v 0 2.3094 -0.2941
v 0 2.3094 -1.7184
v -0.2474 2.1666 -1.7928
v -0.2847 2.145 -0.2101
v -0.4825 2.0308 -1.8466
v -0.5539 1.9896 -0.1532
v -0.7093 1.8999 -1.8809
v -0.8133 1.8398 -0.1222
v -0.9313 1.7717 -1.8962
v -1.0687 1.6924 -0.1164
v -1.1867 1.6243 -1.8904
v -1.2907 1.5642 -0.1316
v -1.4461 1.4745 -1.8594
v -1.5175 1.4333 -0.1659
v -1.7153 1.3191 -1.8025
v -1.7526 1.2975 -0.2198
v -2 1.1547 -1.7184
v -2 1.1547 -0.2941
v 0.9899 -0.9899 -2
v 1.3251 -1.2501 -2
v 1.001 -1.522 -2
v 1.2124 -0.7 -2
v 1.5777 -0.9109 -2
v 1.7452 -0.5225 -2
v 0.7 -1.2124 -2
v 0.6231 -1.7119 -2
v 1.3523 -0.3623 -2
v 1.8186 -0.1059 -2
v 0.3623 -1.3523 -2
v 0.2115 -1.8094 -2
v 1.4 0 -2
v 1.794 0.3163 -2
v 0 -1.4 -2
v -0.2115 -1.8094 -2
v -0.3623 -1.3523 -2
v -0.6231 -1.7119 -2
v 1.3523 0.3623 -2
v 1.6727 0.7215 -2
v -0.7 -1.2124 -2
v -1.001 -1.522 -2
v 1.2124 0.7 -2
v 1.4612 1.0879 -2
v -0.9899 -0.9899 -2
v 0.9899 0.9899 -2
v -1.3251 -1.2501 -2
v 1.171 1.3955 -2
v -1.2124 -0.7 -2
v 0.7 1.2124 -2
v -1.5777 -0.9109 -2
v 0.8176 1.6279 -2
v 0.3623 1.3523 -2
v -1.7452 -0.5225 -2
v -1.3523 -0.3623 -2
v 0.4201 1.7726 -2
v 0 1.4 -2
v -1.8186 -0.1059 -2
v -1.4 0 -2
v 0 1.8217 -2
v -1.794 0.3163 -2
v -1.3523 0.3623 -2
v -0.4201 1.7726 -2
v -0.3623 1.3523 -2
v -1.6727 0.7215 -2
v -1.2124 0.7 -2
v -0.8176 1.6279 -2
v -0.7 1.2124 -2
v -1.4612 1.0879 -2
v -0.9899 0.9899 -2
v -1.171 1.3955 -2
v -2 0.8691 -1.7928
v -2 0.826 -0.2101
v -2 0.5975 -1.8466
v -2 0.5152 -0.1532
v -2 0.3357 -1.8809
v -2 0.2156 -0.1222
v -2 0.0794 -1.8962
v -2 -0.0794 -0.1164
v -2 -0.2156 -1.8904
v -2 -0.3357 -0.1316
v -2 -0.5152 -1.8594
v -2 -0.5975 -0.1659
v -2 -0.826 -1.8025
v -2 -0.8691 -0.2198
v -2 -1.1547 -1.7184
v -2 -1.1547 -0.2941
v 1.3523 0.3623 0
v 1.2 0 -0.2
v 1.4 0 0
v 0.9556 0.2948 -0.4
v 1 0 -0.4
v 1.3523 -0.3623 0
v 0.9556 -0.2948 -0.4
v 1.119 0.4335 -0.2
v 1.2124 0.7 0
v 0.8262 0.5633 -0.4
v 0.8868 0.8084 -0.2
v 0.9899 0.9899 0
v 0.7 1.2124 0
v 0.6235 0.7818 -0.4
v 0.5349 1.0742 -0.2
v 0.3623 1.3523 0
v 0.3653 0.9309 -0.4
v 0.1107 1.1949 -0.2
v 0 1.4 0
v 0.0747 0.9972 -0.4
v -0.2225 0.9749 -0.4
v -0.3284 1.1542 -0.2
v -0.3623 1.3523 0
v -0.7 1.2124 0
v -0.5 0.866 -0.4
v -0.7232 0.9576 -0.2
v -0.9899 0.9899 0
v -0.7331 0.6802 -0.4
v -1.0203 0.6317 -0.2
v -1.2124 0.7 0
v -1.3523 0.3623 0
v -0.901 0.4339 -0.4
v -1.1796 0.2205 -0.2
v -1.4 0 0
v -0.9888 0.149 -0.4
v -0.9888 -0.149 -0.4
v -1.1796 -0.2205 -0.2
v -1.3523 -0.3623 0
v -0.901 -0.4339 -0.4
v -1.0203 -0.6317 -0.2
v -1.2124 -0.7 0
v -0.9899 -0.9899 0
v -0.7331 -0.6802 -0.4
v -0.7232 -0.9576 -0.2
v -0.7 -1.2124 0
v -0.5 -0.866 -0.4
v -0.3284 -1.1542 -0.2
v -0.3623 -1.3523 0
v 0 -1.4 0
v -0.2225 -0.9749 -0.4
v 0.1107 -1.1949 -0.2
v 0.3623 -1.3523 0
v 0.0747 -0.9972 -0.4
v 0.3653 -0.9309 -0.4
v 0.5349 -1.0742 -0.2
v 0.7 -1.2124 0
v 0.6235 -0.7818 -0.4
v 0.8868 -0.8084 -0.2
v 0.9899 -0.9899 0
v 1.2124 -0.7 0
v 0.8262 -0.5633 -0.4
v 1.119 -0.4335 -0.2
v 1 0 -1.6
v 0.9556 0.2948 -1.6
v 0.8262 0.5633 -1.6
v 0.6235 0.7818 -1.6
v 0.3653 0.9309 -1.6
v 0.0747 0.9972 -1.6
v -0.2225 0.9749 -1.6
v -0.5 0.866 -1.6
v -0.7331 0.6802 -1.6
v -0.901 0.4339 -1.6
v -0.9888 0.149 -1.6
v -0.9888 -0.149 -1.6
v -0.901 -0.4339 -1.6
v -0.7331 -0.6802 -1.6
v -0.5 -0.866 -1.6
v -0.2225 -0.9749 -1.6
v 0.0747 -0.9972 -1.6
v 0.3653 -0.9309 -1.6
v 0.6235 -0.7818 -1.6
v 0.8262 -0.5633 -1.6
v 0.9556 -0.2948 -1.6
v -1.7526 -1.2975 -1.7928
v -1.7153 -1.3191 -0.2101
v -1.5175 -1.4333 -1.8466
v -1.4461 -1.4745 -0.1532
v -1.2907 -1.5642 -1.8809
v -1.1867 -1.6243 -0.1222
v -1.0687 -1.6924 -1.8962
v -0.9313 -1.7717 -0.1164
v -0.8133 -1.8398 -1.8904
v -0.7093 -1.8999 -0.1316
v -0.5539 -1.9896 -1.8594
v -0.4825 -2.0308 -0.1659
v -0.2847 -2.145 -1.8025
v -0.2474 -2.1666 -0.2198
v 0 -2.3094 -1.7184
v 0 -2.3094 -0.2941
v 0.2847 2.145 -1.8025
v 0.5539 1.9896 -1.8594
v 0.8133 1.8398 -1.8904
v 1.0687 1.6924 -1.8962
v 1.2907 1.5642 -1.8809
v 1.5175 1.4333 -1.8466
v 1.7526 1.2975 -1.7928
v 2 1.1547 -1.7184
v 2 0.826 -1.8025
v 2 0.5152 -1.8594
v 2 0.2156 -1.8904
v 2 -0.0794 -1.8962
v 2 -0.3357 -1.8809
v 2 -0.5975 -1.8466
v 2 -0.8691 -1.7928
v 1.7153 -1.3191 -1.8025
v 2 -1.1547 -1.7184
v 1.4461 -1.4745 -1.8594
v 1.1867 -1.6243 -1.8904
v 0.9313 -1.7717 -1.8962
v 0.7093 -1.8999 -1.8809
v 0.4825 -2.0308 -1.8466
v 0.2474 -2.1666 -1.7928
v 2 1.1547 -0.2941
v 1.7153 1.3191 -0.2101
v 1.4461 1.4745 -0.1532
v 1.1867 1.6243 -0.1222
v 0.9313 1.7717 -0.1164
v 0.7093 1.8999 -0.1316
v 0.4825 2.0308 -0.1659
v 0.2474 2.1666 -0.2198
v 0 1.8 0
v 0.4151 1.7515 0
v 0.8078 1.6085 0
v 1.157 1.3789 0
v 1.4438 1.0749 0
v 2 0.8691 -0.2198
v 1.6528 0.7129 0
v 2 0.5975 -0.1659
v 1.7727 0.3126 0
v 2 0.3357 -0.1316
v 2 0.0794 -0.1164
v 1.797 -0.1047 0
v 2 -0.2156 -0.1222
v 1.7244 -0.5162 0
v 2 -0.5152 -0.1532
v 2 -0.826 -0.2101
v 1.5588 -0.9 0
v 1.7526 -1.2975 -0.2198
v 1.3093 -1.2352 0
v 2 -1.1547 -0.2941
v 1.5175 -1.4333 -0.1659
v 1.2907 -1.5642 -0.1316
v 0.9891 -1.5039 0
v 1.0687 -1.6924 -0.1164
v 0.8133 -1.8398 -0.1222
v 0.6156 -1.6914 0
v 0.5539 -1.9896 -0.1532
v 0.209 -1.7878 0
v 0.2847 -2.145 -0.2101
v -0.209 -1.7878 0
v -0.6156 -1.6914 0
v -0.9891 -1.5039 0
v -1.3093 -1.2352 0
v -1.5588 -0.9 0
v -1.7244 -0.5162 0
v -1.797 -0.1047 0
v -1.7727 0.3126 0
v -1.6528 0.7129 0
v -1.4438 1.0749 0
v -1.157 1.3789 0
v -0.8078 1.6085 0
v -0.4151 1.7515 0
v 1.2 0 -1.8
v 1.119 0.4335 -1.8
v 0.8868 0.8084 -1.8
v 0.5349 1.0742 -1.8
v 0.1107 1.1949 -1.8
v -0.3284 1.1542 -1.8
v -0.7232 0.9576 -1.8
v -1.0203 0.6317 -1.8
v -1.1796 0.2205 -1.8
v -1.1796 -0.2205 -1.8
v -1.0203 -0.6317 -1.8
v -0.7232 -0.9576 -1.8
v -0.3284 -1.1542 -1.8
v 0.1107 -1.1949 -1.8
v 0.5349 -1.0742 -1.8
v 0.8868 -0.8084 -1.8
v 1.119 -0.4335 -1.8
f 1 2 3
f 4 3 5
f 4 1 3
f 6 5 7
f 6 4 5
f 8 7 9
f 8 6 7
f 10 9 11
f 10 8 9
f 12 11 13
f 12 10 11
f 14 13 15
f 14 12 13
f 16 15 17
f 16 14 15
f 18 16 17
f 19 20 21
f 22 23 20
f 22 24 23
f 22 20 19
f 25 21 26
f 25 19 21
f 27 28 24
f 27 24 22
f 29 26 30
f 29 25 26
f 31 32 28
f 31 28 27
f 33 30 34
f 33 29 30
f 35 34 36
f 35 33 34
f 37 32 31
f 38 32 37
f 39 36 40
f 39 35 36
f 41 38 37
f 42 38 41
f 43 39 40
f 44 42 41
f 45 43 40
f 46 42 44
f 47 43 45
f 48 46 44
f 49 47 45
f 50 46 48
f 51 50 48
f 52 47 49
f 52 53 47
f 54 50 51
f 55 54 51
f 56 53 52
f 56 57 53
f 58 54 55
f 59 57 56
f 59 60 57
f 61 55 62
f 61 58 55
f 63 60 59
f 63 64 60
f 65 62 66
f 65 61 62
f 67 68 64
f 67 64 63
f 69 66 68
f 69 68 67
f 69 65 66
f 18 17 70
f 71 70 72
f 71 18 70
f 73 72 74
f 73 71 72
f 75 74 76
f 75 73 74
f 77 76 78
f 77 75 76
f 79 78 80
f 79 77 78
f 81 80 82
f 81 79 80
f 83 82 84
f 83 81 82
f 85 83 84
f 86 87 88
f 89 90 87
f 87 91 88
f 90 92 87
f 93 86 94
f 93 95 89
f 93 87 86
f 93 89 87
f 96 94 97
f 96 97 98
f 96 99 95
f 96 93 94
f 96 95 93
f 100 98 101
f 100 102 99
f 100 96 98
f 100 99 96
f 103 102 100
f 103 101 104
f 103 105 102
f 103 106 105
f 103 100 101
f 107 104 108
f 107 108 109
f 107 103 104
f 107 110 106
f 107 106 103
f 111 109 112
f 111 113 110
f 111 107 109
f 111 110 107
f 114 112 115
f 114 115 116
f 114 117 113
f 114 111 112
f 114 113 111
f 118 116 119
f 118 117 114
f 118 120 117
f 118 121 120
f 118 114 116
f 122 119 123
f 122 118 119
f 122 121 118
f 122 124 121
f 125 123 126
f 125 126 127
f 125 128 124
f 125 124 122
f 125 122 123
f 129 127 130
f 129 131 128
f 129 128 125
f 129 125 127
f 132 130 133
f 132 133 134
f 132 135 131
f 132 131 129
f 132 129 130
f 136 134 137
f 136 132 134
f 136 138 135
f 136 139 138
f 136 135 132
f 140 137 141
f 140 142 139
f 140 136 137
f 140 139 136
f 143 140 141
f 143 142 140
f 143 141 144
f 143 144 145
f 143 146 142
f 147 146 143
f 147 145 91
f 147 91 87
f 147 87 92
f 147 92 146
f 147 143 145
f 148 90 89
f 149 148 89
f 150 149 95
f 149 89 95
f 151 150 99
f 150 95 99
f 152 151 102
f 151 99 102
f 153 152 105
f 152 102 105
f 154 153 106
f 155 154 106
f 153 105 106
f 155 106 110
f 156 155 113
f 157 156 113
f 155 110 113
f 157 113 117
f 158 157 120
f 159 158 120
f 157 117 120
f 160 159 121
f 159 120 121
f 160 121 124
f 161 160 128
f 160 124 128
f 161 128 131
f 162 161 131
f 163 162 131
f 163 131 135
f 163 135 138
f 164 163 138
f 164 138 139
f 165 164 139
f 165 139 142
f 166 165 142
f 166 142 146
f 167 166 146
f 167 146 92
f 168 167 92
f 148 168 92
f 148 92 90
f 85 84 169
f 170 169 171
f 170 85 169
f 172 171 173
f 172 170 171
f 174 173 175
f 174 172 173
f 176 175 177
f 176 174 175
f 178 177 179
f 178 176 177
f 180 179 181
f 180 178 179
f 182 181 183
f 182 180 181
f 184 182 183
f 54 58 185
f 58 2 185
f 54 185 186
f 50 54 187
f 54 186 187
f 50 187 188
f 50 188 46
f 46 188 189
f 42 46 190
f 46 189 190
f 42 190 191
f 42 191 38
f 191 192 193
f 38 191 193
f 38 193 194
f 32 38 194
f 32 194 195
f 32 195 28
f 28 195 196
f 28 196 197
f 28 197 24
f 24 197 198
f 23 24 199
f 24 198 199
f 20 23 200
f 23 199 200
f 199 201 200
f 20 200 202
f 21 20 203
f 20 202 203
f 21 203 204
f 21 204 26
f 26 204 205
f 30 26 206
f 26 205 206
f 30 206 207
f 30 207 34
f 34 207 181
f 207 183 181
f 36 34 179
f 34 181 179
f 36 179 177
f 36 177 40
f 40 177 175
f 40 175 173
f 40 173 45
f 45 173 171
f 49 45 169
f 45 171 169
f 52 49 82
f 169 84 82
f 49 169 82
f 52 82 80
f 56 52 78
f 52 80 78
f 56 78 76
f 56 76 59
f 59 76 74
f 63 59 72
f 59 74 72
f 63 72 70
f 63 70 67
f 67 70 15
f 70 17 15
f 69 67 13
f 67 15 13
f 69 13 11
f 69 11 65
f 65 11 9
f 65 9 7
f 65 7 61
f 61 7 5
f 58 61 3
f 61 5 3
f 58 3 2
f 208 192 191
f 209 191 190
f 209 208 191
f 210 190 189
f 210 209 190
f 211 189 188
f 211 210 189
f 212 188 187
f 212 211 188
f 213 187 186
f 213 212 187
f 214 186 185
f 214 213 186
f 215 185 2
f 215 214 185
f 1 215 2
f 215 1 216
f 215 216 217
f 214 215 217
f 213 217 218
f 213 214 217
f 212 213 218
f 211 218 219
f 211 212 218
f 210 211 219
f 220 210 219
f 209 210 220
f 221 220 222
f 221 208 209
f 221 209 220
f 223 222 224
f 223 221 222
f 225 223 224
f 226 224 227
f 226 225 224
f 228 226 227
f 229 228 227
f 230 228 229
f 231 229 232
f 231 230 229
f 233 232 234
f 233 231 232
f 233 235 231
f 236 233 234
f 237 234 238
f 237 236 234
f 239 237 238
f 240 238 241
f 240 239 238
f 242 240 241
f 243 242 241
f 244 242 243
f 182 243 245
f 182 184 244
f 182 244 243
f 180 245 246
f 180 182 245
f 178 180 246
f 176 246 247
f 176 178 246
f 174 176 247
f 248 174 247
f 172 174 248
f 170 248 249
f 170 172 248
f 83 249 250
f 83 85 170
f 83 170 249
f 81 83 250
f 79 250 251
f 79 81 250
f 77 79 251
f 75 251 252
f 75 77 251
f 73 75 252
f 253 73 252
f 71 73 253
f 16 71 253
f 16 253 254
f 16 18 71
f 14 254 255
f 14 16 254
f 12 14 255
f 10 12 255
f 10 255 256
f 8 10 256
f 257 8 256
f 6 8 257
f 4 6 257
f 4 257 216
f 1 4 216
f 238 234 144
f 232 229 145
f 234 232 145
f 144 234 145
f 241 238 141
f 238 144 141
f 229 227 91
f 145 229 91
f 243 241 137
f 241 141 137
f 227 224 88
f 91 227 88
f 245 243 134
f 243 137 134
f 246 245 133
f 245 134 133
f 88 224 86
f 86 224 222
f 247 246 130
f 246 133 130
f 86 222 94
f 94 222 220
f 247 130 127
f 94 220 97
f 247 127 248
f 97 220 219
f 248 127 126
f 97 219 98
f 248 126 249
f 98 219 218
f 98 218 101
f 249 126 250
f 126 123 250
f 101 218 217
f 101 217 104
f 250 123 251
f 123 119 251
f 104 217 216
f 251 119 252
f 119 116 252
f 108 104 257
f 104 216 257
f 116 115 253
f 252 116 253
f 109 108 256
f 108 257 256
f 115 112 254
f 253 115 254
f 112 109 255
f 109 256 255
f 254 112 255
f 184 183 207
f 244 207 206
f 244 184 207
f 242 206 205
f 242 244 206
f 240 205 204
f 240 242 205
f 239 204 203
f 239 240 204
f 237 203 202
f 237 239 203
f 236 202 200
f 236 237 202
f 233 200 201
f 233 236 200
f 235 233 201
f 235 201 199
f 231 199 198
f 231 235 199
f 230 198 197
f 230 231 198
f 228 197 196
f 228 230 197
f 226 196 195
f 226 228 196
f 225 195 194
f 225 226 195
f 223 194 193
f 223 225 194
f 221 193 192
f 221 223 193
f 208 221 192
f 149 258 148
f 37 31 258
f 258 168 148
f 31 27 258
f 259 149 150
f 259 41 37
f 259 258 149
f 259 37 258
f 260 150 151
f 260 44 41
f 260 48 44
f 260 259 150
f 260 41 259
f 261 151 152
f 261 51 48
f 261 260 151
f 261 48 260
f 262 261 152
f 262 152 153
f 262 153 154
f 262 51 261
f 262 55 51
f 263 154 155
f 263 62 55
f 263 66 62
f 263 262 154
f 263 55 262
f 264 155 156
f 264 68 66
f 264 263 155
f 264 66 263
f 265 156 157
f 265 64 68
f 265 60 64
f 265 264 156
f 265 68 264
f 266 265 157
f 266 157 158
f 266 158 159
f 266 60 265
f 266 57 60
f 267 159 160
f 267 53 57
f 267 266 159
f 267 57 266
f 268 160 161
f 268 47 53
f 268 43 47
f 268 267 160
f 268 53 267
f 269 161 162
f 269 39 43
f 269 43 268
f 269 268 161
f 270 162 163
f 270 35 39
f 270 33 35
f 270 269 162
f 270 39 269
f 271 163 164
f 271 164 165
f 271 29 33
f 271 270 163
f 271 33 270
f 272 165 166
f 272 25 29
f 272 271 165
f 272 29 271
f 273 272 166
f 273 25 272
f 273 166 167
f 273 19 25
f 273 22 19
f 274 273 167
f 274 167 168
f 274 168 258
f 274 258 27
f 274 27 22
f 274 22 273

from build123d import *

# Parameters (mm, degrees)
SKETCH_1_W               = 5
SKETCH_1_H               = 2
SKETCH_2_OUTSIDE_W       = 14.856
SKETCH_2_OUTSIDE_H       = 14.856
CUT_EXTRUDE_1_DEPTH      = 2
SKETCH_3_R               = 1
CUT_EXTRUDE_2_DEPTH      = 1
CUT_EXTRUDE_2_DEPTH_BACK = 3
CHAMFER_1_SIZE           = 0.4


with BuildPart() as part:
    # Эскиз1 → Повернуть1 (revolve)
    with BuildSketch(Plane(origin=(0, 0, 0), x_dir=(1, 0, 0), z_dir=(0, 1, 0))):
        with Locations((-2.5, 1)):
            Rectangle(SKETCH_1_W, SKETCH_1_H)
    revolve(axis=Axis((0, 0, 0), (0, 0, -1)))

    # Эскиз2 outside → Вырез-Вытянуть1 (cut)
    with BuildSketch(Plane.XY):
        Rectangle(SKETCH_2_OUTSIDE_W, SKETCH_2_OUTSIDE_H)
        Polygon((2, -1.154700538), (2, 1.154700538), (0, 2.309401077), (-2, 1.154700538), (-2, -1.154700538), (0, -2.309401077), align=None, mode=Mode.SUBTRACT)
    extrude(amount=-CUT_EXTRUDE_1_DEPTH, mode=Mode.SUBTRACT)

    # Эскиз3 → Вырез-Вытянуть2 (cut, two sides)
    with BuildSketch(Plane.XY) as cut_extrude_2_sk:
        Circle(SKETCH_3_R)
    extrude(amount=CUT_EXTRUDE_2_DEPTH, mode=Mode.SUBTRACT)
    extrude(cut_extrude_2_sk.sketch, amount=-CUT_EXTRUDE_2_DEPTH_BACK, mode=Mode.SUBTRACT)

    # Эскиз4 → Вырез-Повернуть1 (revolve, cut)
    with BuildSketch(Plane(origin=(0, 0, 0), x_dir=(0, 0, -1), z_dir=(1, 0, 0))):
        Polygon((0, 1.8), (0.294102849, 2.309401077), (0, 2.309401077), align=None)
        Polygon((2.008215931, 1.807483823), (1.714113082, 2.3168849), (2.008215931, 2.3168849), align=None)
    revolve(axis=Axis((0, 0, 0), (0, 0, -1)), mode=Mode.SUBTRACT)

    # Фаска1
    chamfer_1_edges = [part.edges().sort_by_distance(p)[0] for p in [
        (-1, 0, -2),
        (-1, 0, 0),
    ]]
    chamfer(chamfer_1_edges, length=CHAMFER_1_SIZE)


solid = part.part
